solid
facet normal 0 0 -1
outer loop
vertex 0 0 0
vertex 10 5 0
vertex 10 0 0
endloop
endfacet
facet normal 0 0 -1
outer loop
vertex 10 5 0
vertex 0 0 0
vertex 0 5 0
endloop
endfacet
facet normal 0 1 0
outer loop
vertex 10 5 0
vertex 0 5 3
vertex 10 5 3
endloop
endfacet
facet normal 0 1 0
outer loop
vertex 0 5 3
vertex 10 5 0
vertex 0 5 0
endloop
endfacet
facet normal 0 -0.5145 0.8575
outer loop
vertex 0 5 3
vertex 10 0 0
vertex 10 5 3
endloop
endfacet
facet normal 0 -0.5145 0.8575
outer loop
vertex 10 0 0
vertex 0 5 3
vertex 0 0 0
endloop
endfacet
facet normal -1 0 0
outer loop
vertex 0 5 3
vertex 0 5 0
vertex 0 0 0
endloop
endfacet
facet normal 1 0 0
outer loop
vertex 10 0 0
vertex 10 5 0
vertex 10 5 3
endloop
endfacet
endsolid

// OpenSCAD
polyhedron(points=[
        [0.000000, 0.000000, 0.000000],
        [10.000000, 0.000000, 0.000000],
        [10.000000, 5.000000, 0.000000],
        [0.000000, 5.000000, 0.000000],
        [0.000000, 5.000000, 3.000000],
        [10.000000, 5.000000, 3.000000],], 
    faces=[
        [0,1,2,3],
        [5,4,3,2],
        [0,4,5,1],
        [0,3,4],
        [5,2,1]]);
